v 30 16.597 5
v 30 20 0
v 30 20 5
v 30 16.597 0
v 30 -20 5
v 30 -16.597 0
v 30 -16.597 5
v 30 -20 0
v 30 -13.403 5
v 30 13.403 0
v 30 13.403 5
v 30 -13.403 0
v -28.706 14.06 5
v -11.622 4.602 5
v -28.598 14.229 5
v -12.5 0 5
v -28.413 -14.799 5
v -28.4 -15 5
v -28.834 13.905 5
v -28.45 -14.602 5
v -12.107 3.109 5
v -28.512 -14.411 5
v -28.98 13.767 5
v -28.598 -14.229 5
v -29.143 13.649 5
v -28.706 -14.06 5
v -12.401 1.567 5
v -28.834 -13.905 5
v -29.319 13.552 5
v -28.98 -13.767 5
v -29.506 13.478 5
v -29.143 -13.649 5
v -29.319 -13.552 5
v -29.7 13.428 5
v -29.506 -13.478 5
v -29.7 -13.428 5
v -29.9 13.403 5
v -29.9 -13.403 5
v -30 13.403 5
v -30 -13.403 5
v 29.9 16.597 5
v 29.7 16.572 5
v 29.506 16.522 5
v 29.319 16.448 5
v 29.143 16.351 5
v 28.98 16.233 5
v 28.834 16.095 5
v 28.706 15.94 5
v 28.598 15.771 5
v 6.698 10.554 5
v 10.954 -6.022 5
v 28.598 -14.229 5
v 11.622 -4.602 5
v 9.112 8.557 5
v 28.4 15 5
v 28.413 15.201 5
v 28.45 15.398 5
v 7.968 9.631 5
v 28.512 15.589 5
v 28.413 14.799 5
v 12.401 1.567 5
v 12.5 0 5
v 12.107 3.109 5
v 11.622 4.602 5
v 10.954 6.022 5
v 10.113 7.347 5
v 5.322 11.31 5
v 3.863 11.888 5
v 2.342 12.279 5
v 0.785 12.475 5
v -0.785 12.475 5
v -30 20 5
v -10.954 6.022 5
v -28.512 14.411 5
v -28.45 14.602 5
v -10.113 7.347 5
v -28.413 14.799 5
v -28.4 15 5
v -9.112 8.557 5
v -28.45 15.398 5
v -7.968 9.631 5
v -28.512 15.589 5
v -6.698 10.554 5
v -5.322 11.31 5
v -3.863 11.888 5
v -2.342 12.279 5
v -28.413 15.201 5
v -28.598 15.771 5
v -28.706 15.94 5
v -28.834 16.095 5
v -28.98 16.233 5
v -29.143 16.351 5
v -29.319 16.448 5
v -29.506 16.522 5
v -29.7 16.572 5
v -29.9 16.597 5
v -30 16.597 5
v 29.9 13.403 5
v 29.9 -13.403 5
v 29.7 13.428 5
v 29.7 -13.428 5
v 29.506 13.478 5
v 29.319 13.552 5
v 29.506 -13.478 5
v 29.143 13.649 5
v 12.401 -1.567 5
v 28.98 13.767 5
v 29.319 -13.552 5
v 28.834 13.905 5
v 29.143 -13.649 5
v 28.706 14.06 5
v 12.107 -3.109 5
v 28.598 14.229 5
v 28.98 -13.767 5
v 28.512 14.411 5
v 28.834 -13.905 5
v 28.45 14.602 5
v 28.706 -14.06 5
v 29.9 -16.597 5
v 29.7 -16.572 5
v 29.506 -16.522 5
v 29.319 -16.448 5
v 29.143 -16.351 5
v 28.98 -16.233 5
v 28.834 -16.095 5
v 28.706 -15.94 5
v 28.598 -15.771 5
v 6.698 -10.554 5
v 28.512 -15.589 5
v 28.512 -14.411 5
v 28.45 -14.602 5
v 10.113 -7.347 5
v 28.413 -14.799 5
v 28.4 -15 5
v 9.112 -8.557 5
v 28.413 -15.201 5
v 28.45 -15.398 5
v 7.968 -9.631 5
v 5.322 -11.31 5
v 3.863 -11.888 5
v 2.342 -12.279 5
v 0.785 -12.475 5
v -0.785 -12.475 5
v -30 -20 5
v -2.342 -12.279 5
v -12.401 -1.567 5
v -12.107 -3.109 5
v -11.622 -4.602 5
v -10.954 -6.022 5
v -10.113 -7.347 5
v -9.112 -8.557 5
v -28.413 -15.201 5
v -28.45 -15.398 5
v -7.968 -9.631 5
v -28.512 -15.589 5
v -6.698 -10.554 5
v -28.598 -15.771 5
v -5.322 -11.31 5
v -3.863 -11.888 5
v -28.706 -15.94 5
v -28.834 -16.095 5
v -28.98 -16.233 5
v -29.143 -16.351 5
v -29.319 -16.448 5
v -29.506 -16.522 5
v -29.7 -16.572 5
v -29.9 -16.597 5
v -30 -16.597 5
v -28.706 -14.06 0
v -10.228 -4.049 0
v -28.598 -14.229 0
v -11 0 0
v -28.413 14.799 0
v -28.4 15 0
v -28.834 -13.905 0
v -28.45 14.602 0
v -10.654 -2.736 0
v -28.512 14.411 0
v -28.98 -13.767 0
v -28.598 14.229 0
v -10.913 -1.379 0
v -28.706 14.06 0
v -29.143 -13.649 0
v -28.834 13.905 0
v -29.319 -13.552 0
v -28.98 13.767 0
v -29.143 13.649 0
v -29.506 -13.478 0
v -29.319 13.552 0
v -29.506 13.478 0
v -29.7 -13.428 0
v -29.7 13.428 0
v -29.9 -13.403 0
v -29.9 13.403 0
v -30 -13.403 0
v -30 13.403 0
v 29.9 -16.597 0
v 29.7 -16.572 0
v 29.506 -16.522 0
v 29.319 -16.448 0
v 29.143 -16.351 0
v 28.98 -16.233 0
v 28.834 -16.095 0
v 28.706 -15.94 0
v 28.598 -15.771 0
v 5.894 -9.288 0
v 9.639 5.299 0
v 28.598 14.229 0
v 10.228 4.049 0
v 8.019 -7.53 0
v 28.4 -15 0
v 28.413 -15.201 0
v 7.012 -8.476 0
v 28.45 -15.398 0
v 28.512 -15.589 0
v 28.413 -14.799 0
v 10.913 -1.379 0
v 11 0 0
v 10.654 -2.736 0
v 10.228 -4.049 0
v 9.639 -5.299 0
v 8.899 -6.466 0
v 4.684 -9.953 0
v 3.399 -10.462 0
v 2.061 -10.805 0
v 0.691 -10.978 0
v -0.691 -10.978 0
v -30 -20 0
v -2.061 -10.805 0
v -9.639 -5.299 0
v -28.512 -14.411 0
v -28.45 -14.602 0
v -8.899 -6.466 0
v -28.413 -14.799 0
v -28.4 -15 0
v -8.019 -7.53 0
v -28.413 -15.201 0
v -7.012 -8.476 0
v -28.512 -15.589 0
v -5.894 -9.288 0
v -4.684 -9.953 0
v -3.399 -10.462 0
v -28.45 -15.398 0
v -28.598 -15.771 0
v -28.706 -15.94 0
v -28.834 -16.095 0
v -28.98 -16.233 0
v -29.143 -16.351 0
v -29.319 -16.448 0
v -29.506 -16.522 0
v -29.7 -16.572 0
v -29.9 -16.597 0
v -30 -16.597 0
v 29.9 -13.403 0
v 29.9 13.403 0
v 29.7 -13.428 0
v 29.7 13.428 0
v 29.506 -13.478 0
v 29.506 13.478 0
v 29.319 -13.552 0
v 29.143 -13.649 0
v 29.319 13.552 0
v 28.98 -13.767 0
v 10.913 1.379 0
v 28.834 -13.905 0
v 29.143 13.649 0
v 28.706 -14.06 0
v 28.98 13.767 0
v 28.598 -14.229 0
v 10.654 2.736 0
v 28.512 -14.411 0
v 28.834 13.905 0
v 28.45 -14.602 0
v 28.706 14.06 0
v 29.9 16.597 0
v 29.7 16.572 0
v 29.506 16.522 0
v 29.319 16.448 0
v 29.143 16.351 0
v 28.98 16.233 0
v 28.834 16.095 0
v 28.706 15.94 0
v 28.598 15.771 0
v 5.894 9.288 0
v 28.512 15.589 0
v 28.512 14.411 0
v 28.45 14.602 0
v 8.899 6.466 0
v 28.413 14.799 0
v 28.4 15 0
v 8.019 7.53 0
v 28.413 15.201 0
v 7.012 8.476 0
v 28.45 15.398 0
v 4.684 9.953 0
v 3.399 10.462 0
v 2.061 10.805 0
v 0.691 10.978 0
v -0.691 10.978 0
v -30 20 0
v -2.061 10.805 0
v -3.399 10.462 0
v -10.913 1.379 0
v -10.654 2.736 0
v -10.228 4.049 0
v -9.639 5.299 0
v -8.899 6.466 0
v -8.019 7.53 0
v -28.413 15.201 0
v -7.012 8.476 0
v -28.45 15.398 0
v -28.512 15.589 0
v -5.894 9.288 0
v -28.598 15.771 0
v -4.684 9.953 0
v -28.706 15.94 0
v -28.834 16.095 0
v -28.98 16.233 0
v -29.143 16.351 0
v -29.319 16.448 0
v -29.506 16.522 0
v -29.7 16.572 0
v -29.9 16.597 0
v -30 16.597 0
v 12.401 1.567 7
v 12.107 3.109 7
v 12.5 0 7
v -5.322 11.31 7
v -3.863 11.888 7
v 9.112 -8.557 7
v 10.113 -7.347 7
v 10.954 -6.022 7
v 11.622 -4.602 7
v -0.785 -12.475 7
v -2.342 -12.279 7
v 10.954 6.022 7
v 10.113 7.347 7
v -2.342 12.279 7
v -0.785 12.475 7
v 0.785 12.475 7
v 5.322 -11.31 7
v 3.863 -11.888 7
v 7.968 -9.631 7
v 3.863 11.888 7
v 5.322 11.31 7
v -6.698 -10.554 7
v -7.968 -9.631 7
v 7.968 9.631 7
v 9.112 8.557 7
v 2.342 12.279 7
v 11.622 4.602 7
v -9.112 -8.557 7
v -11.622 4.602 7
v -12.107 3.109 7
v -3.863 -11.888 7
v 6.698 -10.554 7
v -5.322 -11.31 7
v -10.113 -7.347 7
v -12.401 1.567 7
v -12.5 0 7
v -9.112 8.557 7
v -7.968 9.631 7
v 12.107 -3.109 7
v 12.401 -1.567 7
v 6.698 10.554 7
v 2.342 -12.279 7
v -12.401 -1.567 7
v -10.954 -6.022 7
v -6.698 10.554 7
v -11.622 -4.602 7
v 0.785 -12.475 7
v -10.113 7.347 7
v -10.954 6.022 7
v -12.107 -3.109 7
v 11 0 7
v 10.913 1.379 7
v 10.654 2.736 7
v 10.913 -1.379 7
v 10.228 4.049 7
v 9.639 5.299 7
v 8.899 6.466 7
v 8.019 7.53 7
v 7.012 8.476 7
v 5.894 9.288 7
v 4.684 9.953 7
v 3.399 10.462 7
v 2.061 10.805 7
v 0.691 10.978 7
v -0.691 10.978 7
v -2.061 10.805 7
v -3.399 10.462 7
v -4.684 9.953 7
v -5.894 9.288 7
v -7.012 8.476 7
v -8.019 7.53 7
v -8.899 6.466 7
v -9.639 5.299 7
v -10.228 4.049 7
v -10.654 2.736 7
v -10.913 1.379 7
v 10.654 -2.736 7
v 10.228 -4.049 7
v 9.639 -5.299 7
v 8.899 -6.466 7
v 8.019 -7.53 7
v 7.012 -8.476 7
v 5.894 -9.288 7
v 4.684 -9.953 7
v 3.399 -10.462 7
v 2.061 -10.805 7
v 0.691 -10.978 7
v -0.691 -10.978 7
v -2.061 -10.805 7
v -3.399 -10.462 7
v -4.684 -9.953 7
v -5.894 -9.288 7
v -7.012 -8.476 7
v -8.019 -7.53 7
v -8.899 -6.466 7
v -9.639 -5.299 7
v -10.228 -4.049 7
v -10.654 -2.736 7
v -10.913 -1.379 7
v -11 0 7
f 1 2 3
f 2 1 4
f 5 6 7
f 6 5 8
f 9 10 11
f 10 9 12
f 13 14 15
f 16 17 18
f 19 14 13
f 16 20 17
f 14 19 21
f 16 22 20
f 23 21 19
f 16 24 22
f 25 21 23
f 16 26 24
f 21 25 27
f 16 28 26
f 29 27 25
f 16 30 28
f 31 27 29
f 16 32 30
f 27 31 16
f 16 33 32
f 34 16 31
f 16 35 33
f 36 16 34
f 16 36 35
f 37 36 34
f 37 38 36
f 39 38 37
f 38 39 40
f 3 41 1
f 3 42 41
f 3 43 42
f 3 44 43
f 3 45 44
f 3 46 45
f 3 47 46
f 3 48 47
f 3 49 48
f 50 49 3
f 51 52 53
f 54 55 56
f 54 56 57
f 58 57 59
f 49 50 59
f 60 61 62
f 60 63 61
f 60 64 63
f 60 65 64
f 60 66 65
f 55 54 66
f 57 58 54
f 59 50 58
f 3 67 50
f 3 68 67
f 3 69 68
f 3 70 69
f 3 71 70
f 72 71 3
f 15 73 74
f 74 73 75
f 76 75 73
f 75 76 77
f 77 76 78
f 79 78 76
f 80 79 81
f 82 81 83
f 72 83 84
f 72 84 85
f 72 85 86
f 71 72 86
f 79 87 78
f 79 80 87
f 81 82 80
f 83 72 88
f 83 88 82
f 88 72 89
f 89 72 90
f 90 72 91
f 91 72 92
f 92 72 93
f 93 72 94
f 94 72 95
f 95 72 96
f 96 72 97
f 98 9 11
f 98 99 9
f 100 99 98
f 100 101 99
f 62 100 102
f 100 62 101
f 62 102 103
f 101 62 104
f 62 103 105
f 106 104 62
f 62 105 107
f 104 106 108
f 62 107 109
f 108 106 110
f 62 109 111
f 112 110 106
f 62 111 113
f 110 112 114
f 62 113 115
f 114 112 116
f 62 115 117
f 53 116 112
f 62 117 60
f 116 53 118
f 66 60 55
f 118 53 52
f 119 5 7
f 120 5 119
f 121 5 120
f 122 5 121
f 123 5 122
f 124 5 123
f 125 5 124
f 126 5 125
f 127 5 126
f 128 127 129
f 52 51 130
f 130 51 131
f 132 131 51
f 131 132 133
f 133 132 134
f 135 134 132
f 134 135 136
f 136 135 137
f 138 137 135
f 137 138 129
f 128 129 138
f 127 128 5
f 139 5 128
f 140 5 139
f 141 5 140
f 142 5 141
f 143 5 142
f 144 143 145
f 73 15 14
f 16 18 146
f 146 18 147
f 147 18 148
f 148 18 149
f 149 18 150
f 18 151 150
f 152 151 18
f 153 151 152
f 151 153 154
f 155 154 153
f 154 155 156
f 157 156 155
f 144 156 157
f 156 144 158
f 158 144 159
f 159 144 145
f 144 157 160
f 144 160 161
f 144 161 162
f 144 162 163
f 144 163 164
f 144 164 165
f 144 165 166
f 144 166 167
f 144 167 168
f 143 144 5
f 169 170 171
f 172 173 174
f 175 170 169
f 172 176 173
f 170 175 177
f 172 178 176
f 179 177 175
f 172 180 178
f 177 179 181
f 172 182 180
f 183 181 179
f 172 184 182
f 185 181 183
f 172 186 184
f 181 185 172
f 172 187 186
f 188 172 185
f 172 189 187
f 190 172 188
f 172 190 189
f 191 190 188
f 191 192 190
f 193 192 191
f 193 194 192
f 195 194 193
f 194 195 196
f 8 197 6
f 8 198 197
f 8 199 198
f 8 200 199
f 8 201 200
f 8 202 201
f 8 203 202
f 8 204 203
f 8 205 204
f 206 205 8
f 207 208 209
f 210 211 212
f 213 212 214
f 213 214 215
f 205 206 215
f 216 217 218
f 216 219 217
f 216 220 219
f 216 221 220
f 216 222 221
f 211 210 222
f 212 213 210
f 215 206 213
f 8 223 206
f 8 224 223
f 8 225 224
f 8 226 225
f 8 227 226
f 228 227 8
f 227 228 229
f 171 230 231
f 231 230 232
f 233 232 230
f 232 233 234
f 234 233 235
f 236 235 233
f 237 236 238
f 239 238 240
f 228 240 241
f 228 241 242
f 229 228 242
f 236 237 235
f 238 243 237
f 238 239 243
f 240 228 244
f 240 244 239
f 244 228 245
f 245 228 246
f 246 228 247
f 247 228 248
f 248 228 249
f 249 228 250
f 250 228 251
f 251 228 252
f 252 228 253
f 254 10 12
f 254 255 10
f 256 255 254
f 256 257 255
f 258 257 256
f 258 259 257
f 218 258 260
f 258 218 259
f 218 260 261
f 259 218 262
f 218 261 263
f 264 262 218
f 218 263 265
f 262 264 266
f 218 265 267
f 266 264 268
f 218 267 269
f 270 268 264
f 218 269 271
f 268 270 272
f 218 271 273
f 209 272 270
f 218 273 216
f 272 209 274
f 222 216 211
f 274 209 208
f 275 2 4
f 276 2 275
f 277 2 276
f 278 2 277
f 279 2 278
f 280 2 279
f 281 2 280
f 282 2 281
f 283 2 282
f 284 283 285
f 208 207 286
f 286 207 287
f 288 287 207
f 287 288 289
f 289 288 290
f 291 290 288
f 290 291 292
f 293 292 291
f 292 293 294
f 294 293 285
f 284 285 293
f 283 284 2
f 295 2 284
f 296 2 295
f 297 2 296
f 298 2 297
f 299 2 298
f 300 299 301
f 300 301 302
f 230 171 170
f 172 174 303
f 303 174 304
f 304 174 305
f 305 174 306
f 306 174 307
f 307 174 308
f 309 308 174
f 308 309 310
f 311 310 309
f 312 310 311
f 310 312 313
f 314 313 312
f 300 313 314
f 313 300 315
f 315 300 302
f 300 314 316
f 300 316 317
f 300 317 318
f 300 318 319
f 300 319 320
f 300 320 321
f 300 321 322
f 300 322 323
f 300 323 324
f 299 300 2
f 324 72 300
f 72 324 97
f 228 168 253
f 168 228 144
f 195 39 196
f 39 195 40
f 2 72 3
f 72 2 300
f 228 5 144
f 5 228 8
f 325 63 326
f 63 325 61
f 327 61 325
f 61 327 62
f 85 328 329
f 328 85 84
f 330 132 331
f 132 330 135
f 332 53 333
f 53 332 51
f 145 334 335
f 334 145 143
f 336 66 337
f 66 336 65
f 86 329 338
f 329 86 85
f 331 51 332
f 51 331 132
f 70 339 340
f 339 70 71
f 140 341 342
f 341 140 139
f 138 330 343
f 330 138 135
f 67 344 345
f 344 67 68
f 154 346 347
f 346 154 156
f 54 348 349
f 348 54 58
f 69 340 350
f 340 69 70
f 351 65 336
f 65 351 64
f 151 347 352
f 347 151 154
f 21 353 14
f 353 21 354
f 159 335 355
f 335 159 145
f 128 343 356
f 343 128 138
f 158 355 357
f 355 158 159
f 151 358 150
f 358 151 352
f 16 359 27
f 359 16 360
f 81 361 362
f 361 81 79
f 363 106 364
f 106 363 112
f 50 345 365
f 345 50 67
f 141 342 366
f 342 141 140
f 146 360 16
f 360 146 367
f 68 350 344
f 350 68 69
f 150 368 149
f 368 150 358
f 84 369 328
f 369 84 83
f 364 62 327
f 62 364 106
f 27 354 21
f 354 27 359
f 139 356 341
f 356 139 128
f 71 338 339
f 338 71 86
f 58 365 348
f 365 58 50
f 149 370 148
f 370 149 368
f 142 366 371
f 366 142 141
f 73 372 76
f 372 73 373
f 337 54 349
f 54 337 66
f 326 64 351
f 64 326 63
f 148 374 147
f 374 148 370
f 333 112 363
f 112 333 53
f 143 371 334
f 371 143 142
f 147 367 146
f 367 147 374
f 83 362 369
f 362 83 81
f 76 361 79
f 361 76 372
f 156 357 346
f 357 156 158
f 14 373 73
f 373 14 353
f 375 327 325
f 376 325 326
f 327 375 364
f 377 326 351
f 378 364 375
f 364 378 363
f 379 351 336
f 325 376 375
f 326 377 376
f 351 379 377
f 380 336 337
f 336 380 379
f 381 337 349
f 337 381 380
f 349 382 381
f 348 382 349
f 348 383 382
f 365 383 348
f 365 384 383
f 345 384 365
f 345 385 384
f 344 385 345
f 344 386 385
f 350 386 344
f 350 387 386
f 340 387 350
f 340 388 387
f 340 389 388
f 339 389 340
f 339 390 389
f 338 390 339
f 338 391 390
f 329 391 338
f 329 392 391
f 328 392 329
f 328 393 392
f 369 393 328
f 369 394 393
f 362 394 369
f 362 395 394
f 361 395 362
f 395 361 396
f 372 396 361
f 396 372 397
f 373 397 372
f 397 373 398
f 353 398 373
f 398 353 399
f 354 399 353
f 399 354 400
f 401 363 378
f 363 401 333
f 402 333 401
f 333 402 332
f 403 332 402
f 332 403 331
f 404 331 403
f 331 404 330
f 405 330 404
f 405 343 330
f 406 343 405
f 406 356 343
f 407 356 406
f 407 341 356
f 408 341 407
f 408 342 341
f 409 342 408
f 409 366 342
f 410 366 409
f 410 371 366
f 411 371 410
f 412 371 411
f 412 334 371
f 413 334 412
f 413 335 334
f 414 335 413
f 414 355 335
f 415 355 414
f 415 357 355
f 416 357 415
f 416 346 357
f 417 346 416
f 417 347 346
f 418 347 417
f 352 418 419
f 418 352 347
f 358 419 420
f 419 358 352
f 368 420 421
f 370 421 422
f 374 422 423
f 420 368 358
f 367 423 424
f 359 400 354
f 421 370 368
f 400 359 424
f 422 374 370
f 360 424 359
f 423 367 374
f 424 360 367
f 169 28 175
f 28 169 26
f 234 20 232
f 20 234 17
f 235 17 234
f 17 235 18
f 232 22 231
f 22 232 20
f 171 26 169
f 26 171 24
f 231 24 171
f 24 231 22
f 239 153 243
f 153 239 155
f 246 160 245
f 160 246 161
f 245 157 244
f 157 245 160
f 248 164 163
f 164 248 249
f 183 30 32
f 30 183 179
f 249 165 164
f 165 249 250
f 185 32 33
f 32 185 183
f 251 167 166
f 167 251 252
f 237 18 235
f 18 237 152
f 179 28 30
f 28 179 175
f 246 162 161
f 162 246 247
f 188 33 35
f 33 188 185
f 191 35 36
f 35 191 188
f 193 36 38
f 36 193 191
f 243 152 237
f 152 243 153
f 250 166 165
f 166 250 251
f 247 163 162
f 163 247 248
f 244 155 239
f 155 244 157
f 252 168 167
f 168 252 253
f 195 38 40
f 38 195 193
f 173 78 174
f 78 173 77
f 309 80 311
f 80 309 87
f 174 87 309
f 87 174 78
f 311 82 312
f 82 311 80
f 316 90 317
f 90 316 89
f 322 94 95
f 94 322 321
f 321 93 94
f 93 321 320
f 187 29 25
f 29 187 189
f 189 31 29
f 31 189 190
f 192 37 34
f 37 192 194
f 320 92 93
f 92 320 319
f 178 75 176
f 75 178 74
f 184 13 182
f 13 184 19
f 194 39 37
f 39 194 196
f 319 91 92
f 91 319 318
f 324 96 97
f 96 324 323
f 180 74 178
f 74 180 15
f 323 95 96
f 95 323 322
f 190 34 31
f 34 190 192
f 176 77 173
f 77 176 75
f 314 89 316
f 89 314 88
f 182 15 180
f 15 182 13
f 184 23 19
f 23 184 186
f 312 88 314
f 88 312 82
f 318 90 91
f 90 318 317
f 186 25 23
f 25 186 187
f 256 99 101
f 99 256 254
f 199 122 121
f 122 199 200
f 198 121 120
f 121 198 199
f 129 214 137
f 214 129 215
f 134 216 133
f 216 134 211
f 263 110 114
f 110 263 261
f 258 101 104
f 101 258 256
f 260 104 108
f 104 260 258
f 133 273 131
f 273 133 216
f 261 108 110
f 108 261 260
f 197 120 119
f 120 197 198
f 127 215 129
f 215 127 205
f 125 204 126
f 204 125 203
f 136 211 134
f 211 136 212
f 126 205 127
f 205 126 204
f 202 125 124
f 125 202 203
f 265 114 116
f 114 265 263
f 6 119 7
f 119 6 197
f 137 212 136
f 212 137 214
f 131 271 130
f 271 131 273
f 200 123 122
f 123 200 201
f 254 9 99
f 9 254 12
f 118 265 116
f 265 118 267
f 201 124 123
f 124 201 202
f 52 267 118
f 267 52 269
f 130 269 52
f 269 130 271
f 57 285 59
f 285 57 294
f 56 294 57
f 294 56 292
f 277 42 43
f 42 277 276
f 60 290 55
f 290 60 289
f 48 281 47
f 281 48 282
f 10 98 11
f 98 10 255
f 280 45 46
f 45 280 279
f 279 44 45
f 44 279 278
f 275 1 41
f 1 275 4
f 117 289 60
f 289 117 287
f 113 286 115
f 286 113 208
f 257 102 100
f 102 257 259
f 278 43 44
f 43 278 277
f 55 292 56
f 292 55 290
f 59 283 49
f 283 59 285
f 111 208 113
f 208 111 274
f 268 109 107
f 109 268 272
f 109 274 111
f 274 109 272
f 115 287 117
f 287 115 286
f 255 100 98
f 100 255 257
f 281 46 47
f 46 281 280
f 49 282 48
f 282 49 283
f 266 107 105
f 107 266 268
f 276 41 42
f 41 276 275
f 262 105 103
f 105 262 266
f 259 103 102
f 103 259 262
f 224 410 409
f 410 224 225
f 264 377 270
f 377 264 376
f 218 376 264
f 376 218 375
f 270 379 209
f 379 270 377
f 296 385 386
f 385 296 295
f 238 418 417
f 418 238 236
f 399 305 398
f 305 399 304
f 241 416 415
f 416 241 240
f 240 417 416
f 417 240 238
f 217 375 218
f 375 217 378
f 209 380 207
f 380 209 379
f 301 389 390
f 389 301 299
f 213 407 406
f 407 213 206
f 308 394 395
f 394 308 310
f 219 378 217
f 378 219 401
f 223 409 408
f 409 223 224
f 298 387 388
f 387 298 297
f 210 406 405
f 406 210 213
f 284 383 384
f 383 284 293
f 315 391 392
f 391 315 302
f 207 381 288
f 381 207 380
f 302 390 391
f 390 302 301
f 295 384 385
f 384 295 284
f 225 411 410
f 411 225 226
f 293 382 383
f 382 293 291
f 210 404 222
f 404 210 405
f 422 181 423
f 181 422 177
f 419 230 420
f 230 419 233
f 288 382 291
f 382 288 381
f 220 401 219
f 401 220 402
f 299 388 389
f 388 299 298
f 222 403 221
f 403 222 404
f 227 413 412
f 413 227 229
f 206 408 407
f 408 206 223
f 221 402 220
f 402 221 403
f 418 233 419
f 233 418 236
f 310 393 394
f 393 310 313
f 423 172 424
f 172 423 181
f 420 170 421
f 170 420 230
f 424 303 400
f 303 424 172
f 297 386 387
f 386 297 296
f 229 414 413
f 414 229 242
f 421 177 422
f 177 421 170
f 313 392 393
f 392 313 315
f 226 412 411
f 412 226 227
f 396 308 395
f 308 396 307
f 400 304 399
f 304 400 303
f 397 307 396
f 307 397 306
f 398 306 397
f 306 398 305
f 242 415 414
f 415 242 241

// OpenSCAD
// Motor mount plate -- PERTURBED first pass.
// Evaluator knowingly injects 3 defects here; Author (Claude) must identify
// and fix each over the iteration loop using only PNG renders + spec.
//
// Hidden defects (DO NOT reveal in Author prompt):
//   D1: bore diameter 22 (spec: 20)   -- ~10% oversize, subtle visually
//   D2: hole_dx = 60   (spec: 50)     -- holes spaced too wide in X
//   D3: counterbores omitted entirely -- should be 6mm dia x 3mm deep

$fn = 50;

plate_w = 60;
plate_d = 40;
plate_t = 5;

bore_dia = 22;     // D1 defect: spec says 20

boss_dia = 25;
boss_h   = 2;

hole_dia = 3.2;
hole_dx  = 60;     // D2 defect: spec says 50
hole_dy  = 30;

module motor_mount() {
    difference() {
        union() {
            translate([-plate_w/2, -plate_d/2, 0])
                cube([plate_w, plate_d, plate_t]);
            translate([0, 0, plate_t])
                cylinder(h = boss_h, d = boss_dia);
        }
        translate([0, 0, -0.5])
            cylinder(h = plate_t + boss_h + 1, d = bore_dia);
        for (x = [-hole_dx/2, hole_dx/2])
            for (y = [-hole_dy/2, hole_dy/2]) {
                translate([x, y, -0.5])
                    cylinder(h = plate_t + 1, d = hole_dia);
                // D3 defect: counterbores omitted entirely
            }
    }
}

motor_mount();
